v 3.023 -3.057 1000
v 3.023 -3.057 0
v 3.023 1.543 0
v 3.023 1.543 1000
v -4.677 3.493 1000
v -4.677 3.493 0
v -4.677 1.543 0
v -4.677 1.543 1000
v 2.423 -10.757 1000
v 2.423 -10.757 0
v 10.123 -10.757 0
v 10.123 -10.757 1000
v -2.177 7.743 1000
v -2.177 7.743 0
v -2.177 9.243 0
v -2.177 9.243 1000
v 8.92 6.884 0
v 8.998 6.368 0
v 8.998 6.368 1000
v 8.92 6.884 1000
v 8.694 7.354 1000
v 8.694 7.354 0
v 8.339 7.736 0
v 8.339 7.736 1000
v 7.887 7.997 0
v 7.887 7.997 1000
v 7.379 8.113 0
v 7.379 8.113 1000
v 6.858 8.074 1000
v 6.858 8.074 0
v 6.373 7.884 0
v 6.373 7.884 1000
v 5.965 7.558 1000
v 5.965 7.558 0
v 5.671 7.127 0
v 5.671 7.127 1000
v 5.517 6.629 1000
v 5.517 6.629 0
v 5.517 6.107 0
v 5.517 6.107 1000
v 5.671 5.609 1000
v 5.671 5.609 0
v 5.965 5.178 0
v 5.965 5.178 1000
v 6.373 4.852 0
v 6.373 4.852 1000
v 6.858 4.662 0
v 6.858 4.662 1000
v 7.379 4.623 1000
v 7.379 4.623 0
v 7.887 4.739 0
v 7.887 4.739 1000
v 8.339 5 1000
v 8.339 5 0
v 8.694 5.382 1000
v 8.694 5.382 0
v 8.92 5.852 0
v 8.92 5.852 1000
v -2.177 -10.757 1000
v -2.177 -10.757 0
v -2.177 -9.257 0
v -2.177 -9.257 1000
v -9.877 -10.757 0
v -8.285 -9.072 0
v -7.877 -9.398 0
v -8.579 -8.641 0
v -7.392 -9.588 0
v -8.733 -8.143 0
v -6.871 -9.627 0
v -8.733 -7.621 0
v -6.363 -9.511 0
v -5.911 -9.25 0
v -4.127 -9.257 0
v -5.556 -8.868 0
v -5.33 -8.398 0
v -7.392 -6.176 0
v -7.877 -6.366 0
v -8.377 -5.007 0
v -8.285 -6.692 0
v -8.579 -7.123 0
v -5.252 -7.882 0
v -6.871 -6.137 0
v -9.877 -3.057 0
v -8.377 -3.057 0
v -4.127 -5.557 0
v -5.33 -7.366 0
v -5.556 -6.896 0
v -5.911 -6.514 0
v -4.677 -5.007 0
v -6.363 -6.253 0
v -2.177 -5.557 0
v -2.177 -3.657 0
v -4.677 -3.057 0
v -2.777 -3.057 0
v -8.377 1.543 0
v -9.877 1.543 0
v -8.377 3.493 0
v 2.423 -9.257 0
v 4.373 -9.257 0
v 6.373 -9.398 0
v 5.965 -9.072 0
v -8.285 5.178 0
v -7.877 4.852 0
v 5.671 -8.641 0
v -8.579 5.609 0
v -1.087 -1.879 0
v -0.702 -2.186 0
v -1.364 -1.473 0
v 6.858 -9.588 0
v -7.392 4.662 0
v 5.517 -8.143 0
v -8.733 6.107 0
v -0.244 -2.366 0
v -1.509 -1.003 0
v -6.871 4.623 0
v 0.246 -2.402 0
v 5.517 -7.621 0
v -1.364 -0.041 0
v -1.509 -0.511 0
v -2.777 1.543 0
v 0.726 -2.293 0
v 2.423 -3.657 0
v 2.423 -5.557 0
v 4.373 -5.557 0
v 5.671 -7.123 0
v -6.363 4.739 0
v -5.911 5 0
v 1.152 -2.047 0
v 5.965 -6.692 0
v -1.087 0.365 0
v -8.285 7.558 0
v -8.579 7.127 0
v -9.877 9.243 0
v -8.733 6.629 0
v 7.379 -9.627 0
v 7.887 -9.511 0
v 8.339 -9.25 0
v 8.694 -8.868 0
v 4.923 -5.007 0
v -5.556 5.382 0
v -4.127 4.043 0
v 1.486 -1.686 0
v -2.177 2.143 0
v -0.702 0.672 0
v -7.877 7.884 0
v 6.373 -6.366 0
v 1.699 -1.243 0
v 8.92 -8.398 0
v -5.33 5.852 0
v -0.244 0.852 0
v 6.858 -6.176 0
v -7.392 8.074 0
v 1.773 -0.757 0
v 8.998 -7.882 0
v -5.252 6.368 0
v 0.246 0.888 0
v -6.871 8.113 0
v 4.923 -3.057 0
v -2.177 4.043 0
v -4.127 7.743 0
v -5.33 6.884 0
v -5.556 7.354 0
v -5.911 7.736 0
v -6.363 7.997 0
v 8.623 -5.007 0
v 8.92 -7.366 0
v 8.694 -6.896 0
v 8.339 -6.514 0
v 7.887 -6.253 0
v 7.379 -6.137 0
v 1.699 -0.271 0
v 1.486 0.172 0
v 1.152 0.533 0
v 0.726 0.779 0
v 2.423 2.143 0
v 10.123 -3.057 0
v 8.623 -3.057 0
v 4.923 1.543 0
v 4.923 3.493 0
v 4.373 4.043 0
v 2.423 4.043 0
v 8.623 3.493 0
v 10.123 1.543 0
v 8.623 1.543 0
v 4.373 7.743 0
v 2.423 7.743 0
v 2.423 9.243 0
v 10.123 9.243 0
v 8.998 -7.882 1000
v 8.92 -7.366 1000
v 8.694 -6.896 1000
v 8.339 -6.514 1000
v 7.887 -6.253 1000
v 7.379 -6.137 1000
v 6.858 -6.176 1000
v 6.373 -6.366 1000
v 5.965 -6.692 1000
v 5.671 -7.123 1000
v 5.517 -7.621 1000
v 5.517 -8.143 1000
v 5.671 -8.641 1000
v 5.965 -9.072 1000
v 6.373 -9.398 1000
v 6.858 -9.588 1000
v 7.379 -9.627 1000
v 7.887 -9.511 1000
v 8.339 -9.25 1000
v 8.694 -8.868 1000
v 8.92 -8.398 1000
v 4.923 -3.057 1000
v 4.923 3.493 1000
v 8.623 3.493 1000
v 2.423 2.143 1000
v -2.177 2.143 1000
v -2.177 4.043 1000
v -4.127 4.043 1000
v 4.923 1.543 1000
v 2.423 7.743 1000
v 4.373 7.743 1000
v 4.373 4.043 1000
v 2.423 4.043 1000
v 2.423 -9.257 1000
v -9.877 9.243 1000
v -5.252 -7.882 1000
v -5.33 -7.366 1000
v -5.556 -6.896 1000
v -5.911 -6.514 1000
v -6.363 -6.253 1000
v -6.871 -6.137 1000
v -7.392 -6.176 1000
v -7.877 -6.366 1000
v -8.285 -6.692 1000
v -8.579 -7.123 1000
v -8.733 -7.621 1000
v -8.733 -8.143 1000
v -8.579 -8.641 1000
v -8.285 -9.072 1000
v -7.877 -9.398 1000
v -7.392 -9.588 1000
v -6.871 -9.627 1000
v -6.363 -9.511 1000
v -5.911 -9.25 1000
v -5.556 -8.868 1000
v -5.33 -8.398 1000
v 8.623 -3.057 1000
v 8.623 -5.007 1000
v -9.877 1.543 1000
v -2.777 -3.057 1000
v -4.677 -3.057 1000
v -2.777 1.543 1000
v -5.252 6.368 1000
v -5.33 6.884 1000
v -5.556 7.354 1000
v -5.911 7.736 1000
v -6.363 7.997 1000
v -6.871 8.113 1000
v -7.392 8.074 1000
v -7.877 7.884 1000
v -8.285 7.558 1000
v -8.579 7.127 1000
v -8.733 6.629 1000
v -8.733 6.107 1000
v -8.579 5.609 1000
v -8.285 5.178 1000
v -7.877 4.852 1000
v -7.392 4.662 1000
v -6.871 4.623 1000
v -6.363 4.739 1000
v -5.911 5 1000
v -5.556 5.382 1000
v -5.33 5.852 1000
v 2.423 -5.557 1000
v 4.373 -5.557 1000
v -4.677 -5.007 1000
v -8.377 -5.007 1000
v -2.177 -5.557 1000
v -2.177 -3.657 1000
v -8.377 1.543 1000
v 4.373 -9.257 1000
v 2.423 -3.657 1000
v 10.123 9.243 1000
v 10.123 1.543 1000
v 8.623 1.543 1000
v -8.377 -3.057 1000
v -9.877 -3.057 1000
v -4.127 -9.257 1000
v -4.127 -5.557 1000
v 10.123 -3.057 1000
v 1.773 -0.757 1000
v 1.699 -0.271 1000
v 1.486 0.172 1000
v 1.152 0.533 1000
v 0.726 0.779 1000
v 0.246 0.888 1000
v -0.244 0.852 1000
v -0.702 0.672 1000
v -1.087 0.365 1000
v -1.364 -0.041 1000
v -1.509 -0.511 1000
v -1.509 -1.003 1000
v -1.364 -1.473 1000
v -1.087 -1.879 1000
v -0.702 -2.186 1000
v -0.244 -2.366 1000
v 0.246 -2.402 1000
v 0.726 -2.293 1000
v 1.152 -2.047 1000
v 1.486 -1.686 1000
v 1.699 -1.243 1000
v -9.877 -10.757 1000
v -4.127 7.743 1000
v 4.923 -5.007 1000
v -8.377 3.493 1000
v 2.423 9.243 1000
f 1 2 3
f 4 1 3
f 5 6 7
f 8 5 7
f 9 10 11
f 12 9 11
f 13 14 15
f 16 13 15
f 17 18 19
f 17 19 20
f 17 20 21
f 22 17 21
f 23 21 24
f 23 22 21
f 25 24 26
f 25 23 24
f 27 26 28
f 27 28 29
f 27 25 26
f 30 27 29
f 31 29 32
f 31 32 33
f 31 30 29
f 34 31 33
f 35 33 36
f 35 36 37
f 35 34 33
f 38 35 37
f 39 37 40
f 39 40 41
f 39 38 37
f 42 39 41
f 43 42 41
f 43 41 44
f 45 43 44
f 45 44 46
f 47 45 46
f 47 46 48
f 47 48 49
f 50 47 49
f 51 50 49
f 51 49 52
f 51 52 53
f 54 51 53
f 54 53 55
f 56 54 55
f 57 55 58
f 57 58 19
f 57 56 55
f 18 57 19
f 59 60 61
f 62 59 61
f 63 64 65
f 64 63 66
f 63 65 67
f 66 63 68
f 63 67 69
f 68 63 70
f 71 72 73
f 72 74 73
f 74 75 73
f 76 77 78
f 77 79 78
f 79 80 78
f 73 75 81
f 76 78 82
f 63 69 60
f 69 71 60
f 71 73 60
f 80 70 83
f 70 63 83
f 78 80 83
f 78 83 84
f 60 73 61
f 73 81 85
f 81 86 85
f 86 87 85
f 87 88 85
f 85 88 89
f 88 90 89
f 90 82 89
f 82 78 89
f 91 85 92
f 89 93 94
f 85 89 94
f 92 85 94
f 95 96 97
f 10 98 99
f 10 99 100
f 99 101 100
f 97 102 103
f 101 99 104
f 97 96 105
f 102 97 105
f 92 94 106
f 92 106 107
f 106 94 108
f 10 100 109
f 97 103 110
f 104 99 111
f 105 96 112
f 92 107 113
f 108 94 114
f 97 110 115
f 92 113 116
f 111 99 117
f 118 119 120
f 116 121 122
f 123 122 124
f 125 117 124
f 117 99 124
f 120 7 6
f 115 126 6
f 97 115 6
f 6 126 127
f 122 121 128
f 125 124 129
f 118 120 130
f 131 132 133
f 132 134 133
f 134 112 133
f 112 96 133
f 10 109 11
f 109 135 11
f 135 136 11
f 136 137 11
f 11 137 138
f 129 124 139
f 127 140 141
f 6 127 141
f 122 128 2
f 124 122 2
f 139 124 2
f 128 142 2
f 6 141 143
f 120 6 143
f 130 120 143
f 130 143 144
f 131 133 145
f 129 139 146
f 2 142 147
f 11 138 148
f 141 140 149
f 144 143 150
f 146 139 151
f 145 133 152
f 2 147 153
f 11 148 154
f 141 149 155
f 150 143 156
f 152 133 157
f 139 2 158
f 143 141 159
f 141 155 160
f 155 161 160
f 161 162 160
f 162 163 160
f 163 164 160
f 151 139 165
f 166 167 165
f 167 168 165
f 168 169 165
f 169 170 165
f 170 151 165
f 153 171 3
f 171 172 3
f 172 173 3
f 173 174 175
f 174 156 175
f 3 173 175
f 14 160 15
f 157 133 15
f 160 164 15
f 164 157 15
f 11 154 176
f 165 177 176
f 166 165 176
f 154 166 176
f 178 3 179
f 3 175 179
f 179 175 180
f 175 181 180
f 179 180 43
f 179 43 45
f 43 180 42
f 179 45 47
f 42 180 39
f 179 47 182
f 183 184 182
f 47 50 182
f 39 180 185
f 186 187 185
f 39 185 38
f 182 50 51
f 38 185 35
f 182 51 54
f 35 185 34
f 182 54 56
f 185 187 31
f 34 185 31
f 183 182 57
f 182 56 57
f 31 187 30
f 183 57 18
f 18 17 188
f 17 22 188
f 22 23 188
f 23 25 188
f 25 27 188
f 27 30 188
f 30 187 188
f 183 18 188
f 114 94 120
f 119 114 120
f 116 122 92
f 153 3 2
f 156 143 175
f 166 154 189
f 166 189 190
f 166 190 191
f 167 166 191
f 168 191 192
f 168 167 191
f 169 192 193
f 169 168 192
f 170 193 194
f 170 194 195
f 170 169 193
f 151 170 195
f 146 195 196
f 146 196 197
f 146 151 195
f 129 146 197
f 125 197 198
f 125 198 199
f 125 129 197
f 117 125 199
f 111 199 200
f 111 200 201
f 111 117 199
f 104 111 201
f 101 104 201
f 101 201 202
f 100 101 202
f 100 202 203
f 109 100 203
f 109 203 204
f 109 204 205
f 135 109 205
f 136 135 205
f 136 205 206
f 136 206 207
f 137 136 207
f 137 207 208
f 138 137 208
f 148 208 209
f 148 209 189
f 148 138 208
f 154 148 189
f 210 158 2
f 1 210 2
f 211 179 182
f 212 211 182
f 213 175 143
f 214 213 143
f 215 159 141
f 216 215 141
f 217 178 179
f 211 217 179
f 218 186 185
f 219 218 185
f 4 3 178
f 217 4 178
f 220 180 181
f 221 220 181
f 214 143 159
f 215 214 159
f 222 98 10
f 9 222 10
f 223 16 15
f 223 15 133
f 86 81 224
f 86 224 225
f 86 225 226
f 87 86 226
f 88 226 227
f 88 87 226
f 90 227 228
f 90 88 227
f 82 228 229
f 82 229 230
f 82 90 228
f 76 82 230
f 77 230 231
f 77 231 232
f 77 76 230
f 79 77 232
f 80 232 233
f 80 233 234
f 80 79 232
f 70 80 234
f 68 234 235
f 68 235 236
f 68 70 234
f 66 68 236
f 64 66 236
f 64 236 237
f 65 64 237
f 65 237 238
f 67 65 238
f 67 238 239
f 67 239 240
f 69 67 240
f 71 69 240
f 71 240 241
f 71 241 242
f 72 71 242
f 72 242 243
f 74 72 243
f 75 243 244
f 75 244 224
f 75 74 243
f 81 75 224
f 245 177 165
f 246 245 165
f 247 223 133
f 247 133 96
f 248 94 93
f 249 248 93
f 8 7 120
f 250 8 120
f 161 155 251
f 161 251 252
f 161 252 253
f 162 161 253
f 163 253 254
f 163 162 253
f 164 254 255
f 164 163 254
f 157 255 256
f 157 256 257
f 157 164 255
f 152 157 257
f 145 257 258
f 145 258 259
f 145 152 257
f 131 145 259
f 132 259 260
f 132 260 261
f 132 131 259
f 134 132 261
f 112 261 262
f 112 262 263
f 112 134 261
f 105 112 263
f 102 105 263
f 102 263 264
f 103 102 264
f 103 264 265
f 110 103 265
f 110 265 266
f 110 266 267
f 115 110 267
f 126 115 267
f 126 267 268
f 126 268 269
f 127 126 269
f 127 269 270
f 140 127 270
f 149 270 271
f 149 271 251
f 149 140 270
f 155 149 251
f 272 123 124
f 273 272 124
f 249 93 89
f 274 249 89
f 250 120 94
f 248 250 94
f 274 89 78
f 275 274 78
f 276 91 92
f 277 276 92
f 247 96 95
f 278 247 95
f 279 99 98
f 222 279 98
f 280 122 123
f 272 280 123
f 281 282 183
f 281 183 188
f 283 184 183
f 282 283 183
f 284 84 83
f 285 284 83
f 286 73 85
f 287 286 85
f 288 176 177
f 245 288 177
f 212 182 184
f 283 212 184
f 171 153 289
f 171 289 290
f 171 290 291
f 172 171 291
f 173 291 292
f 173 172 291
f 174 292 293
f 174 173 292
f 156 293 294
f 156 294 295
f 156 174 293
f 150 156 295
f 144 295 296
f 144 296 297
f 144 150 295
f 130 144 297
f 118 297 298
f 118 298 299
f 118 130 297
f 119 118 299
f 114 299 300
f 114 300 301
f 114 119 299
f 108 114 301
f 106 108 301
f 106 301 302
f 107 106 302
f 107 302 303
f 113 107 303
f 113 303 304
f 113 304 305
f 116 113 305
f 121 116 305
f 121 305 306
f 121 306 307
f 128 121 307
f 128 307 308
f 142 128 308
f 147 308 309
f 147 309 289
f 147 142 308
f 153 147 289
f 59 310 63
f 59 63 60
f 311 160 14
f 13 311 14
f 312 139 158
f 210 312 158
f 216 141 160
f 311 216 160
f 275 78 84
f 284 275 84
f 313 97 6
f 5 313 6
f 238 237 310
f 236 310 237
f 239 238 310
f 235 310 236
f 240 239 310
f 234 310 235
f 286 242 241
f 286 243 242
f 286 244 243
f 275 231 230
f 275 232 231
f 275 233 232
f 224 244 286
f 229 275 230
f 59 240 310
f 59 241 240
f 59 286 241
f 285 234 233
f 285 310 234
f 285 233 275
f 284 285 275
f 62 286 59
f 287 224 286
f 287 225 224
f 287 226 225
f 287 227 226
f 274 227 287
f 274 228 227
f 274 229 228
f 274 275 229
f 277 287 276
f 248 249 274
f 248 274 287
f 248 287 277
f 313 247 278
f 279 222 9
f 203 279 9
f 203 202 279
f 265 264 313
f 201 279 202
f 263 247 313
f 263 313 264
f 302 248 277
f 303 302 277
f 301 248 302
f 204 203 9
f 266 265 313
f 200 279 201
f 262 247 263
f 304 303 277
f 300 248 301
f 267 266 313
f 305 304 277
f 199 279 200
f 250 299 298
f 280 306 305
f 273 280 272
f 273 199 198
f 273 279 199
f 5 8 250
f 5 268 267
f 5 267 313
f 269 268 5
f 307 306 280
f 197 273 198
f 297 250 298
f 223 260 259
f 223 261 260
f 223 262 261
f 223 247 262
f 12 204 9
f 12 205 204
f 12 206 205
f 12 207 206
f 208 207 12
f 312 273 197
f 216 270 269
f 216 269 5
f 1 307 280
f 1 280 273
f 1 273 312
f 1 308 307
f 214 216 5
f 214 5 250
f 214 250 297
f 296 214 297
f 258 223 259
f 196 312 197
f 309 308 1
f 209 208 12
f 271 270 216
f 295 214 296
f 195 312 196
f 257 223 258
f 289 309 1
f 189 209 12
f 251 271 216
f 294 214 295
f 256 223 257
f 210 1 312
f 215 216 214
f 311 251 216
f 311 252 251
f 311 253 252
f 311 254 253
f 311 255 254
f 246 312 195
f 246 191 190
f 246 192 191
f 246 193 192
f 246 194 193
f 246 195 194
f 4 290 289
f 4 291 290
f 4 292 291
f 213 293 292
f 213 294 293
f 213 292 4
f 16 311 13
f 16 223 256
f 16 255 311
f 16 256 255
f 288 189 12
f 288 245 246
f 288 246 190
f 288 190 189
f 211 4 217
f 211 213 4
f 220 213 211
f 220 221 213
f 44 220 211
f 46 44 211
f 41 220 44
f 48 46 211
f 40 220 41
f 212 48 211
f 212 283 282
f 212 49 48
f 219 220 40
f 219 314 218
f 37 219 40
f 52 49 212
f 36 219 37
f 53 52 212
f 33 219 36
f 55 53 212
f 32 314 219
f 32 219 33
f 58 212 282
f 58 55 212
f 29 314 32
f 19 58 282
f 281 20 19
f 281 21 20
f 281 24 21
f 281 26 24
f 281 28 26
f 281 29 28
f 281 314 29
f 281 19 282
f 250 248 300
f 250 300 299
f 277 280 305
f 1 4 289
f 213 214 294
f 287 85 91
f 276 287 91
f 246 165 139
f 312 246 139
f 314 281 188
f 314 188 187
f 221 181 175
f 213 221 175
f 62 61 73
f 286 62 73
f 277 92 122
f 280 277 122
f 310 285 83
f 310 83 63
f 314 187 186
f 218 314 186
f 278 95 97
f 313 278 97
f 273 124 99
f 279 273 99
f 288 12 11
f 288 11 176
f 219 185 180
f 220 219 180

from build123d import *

# Parameters (mm, degrees)
SKETCH_1_R      = 1.65
SKETCH_1_R_2    = 1.75
EXTRUDE_1_DEPTH = 1000


with BuildPart() as part:
    # 草图1 → 凸台-拉伸1 (new body)
    with BuildSketch(Plane.XY):
        Polygon((-2.177197952, 9.242987377), (-9.877197952, 9.242987377), (-9.877197952, 1.542987377), (-8.377197952, 1.542987377), (-8.377197952, 3.492987377), (-4.677197952, 3.492987377), (-4.677197952, 1.542987377), (-2.777197952, 1.542987377), (-2.777197952, -3.057012623), (-4.677197952, -3.057012623), (-4.677197952, -5.007012623), (-8.377197952, -5.007012623), (-8.377197952, -3.057012623), (-9.877197952, -3.057012623), (-9.877197952, -10.757012623), (-2.177197952, -10.757012623), (-2.177197952, -9.257012623), (-4.127197952, -9.257012623), (-4.127197952, -5.557012623), (-2.177197952, -5.557012623), (-2.177197952, -3.657012623), (2.422802048, -3.657012623), (2.422802048, -5.557012623), (4.372802048, -5.557012623), (4.372802048, -9.257012623), (2.422802048, -9.257012623), (2.422802048, -10.757012623), (10.122802048, -10.757012623), (10.122802048, -3.057012623), (8.622802048, -3.057012623), (8.622802048, -5.007012623), (4.922802048, -5.007012623), (4.922802048, -3.057012623), (3.022802048, -3.057012623), (3.022802048, 1.542987377), (4.922802048, 1.542987377), (4.922802048, 3.492987377), (8.622802048, 3.492987377), (8.622802048, 1.542987377), (10.122802048, 1.542987377), (10.122802048, 9.242987377), (2.422802048, 9.242987377), (2.422802048, 7.742987377), (4.372802048, 7.742987377), (4.372802048, 4.042987377), (2.422802048, 4.042987377), (2.422802048, 2.142987377), (-2.177197952, 2.142987377), (-2.177197952, 4.042987377), (-4.127197952, 4.042987377), (-4.127197952, 7.742987377), (-2.177197952, 7.742987377), align=None)
        with Locations((0.122802048, -0.757012623)):
            Circle(SKETCH_1_R, mode=Mode.SUBTRACT)
        with Locations((-7.002197952, 6.367987377)):
            Circle(SKETCH_1_R_2, mode=Mode.SUBTRACT)
        with Locations((7.247802048, 6.367987377)):
            Circle(SKETCH_1_R_2, mode=Mode.SUBTRACT)
        with Locations((-7.002197952, -7.882012623)):
            Circle(SKETCH_1_R_2, mode=Mode.SUBTRACT)
        with Locations((7.247802048, -7.882012623)):
            Circle(SKETCH_1_R_2, mode=Mode.SUBTRACT)
    extrude(amount=EXTRUDE_1_DEPTH)


solid = part.part
